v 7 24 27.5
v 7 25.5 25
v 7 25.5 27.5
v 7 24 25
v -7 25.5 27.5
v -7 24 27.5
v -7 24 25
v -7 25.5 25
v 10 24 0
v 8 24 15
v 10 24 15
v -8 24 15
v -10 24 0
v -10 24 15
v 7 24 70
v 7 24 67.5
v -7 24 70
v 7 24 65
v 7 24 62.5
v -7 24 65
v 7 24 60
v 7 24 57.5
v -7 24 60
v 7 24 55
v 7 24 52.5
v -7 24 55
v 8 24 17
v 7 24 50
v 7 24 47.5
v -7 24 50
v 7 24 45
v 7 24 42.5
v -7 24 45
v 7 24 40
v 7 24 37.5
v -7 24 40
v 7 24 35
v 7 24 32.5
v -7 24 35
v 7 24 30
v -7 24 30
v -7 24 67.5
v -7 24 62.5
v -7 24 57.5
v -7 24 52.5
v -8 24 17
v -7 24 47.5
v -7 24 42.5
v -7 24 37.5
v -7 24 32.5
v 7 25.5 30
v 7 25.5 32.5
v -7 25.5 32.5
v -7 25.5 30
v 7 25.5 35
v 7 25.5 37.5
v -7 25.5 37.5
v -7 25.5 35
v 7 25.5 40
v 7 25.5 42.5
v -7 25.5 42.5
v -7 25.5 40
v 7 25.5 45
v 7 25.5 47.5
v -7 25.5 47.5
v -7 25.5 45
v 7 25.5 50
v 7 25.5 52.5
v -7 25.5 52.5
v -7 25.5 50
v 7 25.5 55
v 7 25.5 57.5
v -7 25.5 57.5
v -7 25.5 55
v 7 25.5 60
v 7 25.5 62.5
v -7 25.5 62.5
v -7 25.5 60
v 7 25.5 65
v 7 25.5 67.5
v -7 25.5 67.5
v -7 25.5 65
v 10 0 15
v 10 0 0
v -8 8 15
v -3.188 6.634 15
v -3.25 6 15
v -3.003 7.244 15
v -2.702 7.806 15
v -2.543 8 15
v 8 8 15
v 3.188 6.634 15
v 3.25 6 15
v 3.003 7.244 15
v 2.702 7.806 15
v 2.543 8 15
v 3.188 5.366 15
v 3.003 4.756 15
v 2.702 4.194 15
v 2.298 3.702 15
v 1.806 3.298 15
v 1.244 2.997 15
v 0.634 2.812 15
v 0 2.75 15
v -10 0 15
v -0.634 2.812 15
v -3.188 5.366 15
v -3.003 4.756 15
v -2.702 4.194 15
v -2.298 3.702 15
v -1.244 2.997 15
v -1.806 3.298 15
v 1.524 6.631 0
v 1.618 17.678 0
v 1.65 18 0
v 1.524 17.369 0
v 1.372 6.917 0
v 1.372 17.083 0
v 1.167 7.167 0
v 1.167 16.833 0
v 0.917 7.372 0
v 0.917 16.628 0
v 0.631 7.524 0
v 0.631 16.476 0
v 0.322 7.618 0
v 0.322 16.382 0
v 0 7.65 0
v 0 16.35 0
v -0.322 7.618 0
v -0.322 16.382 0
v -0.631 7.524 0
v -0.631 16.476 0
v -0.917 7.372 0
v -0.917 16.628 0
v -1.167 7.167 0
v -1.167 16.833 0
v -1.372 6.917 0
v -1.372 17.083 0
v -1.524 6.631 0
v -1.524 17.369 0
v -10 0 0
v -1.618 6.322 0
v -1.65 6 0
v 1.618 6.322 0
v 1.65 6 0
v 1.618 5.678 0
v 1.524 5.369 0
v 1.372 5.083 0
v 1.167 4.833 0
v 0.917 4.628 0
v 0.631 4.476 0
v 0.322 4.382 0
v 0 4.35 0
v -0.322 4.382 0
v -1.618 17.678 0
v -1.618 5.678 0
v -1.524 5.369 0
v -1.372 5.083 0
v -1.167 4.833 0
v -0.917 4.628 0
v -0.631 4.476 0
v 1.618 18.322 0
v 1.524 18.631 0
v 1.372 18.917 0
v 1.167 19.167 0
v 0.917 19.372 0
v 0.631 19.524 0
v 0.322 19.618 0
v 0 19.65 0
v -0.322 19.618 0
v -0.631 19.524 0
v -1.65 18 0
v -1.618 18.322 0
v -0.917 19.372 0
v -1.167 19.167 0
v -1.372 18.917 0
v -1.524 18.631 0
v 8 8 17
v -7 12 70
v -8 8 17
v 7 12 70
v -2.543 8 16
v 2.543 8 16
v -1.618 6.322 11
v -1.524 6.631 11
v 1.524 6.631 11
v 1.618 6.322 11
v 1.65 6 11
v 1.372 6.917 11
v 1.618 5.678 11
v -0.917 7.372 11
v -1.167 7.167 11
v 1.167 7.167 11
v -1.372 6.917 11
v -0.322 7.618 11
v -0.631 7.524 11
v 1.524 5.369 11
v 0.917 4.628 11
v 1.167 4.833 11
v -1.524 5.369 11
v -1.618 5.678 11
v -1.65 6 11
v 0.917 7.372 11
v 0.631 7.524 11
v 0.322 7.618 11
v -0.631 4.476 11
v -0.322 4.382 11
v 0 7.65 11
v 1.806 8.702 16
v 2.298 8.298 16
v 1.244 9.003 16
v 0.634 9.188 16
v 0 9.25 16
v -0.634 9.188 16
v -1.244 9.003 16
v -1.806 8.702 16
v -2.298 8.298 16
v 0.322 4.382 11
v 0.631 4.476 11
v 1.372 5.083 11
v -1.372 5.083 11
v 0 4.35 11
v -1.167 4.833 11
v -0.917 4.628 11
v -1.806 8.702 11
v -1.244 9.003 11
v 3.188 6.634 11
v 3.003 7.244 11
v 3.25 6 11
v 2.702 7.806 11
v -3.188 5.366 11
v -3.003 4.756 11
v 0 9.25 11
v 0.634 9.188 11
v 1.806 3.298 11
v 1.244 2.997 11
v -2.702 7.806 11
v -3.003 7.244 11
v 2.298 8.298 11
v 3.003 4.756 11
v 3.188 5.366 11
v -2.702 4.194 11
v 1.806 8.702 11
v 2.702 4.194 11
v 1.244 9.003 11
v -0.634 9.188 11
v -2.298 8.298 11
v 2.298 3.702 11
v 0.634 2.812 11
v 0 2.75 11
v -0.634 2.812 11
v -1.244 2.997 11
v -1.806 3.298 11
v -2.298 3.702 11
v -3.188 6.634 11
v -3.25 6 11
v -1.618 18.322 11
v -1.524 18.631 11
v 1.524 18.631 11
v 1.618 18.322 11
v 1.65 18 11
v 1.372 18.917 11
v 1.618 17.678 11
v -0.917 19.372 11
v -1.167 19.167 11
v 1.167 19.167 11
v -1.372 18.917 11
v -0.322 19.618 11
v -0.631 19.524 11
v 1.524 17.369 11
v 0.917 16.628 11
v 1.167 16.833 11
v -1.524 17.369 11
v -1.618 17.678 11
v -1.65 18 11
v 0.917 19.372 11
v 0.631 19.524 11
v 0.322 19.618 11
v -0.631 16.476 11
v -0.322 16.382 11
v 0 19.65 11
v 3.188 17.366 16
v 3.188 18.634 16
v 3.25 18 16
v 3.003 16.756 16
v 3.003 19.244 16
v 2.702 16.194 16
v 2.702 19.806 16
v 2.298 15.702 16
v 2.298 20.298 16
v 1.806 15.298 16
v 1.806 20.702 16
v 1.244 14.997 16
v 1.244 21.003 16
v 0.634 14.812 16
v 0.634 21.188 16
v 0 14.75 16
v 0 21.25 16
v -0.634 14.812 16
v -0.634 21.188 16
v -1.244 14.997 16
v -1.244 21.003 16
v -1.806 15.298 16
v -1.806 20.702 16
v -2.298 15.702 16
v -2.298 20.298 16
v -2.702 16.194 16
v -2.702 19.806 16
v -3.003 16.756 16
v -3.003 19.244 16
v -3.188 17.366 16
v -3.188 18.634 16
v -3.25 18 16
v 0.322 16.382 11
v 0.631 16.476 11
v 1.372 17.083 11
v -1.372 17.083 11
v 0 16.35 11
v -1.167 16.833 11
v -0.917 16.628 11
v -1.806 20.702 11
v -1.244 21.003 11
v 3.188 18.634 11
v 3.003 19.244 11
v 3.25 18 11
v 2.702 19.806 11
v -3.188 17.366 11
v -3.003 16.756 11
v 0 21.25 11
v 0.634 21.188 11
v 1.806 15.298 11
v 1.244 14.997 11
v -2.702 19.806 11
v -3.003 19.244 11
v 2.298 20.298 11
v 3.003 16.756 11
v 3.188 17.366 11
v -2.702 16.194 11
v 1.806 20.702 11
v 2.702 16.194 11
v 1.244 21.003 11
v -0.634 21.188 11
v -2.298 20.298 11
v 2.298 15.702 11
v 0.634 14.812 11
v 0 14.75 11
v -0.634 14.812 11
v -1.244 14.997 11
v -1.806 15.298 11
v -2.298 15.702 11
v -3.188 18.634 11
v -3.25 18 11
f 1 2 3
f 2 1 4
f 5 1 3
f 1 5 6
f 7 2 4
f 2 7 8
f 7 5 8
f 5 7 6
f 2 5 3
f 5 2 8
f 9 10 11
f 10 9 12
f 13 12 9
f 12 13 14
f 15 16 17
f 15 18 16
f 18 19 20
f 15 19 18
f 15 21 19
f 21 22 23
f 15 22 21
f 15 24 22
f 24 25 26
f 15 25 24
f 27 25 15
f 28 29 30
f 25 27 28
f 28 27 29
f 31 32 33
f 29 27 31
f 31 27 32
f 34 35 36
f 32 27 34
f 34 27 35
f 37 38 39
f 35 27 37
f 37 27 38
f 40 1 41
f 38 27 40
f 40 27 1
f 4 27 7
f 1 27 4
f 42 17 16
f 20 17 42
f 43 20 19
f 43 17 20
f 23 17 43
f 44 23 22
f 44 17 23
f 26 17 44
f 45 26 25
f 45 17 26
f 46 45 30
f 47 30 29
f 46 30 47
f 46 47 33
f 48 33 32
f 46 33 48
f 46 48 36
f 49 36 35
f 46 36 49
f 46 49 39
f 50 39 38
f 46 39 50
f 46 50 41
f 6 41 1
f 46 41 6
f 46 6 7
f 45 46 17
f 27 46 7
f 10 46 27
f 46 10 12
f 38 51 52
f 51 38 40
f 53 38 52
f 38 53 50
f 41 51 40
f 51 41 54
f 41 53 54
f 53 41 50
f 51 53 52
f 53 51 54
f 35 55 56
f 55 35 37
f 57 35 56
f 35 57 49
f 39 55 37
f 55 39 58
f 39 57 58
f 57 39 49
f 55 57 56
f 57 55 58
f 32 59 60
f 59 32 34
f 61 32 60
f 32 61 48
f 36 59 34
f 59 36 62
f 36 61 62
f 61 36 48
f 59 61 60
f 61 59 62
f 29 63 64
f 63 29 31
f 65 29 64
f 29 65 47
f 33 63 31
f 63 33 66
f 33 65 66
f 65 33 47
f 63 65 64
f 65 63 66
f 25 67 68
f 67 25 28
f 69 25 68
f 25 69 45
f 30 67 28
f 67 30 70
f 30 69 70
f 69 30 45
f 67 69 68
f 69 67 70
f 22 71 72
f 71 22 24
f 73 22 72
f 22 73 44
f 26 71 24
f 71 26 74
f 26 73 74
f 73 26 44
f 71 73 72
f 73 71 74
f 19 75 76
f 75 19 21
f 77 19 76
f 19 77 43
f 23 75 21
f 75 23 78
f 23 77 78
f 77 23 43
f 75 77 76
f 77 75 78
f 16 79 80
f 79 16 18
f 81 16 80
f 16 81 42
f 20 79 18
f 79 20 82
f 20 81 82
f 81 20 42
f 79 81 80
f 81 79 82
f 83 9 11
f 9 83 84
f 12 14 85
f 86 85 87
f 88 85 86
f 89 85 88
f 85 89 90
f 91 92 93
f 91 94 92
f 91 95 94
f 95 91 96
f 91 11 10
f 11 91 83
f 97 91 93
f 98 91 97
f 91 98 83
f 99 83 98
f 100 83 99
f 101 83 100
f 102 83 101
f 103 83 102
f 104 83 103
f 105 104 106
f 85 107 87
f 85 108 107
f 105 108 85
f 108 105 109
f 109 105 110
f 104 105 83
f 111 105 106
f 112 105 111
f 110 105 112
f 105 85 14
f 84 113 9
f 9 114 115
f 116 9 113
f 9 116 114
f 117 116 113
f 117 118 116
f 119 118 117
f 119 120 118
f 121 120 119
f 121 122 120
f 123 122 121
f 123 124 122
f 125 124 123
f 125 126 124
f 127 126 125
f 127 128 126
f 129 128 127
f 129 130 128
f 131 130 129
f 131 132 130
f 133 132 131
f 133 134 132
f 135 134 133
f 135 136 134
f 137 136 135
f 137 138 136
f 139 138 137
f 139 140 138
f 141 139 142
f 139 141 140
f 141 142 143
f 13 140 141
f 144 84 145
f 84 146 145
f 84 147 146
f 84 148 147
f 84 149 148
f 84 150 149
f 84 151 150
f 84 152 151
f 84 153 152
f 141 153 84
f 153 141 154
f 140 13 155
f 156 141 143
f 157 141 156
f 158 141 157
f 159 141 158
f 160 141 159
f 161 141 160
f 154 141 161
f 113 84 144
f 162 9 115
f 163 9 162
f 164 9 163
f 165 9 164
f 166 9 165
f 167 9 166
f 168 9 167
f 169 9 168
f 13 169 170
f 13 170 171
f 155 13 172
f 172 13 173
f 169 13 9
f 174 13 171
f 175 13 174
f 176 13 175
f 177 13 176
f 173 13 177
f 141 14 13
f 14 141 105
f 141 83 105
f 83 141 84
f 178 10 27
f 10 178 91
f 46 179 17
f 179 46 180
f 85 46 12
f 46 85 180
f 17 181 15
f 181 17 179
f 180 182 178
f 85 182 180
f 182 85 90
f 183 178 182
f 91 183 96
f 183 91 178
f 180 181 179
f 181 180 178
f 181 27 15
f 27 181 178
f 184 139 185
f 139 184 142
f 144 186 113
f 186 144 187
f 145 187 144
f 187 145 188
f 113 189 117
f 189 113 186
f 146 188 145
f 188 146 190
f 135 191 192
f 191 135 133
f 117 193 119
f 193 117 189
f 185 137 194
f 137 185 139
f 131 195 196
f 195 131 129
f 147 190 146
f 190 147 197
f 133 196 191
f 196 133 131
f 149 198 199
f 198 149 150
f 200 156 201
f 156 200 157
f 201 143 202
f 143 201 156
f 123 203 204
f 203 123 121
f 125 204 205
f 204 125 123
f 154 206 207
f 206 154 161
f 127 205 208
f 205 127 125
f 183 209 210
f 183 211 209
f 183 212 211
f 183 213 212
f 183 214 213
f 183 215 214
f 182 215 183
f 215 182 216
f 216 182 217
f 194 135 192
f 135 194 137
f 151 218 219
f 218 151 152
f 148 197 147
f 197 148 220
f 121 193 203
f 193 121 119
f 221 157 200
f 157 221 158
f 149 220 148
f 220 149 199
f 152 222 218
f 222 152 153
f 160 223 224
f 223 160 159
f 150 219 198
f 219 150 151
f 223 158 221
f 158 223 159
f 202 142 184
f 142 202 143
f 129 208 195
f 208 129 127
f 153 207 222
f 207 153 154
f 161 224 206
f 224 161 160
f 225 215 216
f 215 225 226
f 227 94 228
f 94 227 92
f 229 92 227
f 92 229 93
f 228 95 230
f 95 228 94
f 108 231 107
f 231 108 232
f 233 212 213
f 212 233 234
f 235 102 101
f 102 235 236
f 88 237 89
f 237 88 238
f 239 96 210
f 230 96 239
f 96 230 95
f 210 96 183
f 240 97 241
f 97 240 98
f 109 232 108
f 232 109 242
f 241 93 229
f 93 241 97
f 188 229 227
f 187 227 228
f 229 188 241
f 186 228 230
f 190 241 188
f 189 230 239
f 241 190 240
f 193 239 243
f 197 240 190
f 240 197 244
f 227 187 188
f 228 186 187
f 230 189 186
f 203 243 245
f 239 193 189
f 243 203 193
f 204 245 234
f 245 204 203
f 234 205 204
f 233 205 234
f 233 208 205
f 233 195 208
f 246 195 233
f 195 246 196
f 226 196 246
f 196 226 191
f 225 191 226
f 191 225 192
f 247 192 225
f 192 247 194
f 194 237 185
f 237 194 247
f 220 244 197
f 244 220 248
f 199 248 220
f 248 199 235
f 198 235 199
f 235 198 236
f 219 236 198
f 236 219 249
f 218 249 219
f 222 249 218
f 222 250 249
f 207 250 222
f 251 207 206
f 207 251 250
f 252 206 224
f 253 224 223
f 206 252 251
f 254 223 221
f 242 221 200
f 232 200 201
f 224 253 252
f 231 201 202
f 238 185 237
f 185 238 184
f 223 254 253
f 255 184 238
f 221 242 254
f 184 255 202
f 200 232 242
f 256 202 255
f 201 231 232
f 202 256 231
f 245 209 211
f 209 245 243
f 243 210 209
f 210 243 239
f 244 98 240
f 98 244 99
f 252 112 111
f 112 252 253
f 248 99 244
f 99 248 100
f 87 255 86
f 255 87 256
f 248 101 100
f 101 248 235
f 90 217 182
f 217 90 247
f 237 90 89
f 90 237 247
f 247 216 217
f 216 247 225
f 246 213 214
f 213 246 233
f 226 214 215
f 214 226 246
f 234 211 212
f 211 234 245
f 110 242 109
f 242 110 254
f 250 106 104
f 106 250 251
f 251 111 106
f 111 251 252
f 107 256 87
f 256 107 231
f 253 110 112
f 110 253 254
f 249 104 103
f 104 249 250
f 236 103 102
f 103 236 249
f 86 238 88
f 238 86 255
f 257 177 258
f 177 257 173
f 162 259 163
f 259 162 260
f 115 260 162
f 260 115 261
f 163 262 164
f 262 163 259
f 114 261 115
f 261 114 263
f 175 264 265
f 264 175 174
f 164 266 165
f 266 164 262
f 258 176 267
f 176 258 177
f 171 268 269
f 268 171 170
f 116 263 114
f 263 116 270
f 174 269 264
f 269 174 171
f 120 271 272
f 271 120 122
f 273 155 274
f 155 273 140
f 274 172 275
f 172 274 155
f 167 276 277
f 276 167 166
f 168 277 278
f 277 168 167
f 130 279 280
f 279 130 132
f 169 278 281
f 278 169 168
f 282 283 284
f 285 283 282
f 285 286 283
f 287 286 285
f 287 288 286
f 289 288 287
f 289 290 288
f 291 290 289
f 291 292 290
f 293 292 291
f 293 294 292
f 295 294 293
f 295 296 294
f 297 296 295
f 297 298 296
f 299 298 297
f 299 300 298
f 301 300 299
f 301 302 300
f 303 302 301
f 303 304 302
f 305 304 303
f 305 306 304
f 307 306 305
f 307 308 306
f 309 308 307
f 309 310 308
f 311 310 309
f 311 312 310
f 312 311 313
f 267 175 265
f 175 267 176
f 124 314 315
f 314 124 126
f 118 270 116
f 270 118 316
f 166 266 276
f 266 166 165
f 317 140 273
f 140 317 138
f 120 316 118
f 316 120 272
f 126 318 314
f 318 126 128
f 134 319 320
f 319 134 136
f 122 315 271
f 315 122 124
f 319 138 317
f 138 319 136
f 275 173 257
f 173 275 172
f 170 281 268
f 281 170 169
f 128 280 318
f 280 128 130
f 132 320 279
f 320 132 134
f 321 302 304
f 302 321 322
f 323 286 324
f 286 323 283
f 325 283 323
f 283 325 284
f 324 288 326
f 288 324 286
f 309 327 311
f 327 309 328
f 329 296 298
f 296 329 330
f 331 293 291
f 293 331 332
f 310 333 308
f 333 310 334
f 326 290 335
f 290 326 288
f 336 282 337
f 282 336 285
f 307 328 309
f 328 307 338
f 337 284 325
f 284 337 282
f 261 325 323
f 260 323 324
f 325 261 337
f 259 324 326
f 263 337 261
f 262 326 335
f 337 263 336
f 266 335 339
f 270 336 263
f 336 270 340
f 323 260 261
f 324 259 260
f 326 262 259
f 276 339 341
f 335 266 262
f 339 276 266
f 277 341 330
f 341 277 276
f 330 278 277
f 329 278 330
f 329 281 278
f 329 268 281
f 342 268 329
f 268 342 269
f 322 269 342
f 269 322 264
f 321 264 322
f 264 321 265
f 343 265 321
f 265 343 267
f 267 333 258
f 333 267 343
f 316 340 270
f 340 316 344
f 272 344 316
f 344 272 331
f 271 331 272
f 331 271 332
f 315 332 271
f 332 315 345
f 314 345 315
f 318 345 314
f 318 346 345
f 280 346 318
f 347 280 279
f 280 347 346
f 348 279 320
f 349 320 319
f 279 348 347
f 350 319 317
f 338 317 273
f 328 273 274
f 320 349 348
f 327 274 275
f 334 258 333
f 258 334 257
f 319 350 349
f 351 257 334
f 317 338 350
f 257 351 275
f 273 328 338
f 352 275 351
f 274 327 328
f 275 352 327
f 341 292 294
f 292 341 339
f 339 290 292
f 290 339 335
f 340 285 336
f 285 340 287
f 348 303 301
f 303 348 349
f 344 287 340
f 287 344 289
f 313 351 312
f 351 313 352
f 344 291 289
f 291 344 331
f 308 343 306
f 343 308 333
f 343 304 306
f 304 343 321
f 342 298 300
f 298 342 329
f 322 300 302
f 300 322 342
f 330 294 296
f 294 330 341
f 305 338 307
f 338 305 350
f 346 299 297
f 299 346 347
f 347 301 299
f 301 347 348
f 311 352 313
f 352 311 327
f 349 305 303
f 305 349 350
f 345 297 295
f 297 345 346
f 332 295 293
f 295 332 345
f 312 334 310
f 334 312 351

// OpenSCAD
// ==============================================================================
// ENPIRE Parametric Gripper Finger
// OpenSCAD Source File for NVIDIA GEAR ENPIRE-compatible Gripper Designs
// ==============================================================================
// Description: Fully customizable parametric gripper finger supporting
//              I2RT YAM, AgileX Piper, Robotiq 2F-85/140, Franka Panda, SO-100.
// ==============================================================================

/* [General Dimensions (mm)] */
finger_length       = 70.0;    // Total height of the finger beam
base_width          = 20.0;    // Width at the mounting base
base_depth          = 24.0;    // Depth at the mounting base
base_height         = 15.0;    // Height of the base mounting block
beam_thickness      = 12.0;    // Structural beam thickness
tip_width           = 14.0;    // Width at the contact tip
tip_length          = 35.0;    // Height of the contact pad zone

/* [Mounting Screws & Inserts] */
screw_type          = "M3";    // [M2.5, M3, M4, M5]
screw_diameter      = 3.3;     // Clearance hole diameter (3.3mm for M3, 4.3mm for M4)
screw_spacing       = 12.0;    // Distance between mounting hole centers
counterbore_diam    = 6.5;     // Counterbore diameter for socket head cap screw
counterbore_depth   = 4.0;     // Counterbore depth
heatset_insert      = false;   // Set true to generate heat-set brass insert pockets (e.g. M3x4x5)
insert_diameter     = 4.2;     // Heat-set insert outer diameter

/* [Friction Surface & Textures] */
grip_texture        = "grooved"; // [smooth, grooved, v_notch, tpu_slot, silicone_pocket]
groove_pitch        = 5.0;     // Spacing between friction ribs
groove_depth        = 1.5;     // Rib height / depth
tpu_recess_depth    = 2.0;     // Depth for snap-in TPU pad

/* [Symmetry & Mirroring] */
is_mirrored         = false;   // Generate left (false) or right (true) finger

// ------------------------------------------------------------------------------
// Modules
// ------------------------------------------------------------------------------

module bolt_hole() {
    union() {
        cylinder(h=base_height + 2, r=screw_diameter/2, center=true, $fn=32);
        translate([0, 0, base_height/2 - counterbore_depth])
            cylinder(h=counterbore_depth + 1, r=counterbore_diam/2, $fn=32);
        if (heatset_insert) {
            translate([0, 0, -base_height/2 - 0.1])
                cylinder(h=5.5, r=insert_diameter/2, $fn=32);
        }
    }
}

module finger_body() {
    difference() {
        union() {
            // Mounting Base
            translate([-base_width/2, 0, 0])
                cube([base_width, base_depth, base_height]);
            
            // Structural Beam
            hull() {
                translate([-base_width/2 + 2, 8, base_height - 2])
                    cube([base_width - 4, base_depth - 8, 4]);
                translate([-tip_width/2, base_depth - beam_thickness, finger_length - 5])
                    cube([tip_width, beam_thickness, 5]);
            }
            
            // Tip Head
            translate([-tip_width/2, base_depth - beam_thickness, finger_length - 5])
                cube([tip_width, beam_thickness, 5]);
                
            // Grip texturing
            if (grip_texture == "grooved") {
                for (z = [base_height + 10 : groove_pitch : finger_length - 5]) {
                    translate([-tip_width/2, base_depth, z])
                        cube([tip_width, groove_depth, groove_pitch/2]);
                }
            }
        }
        
        // Mounting Holes
        translate([0, base_depth/2 - screw_spacing/2, base_height/2])
            bolt_hole();
        translate([0, base_depth/2 + screw_spacing/2, base_height/2])
            bolt_hole();
            
        // TPU / Silicone insert recess
        if (grip_texture == "tpu_slot" || grip_texture == "silicone_pocket") {
            translate([-tip_width/2 + 1.5, base_depth - tpu_recess_depth, finger_length - tip_length])
                cube([tip_width - 3, tpu_recess_depth + 1, tip_length - 2]);
        }
        
        // V-notch clamp for cylinders
        if (grip_texture == "v_notch") {
            translate([0, base_depth, finger_length - tip_length/2])
                rotate([0, 45, 0])
                    cube([10, 10, 10], center=true);
        }
    }
}

// ------------------------------------------------------------------------------
// Top-Level Assembly Render
// ------------------------------------------------------------------------------
mirror([is_mirrored ? 1 : 0, 0, 0]) {
    finger_body();
}
